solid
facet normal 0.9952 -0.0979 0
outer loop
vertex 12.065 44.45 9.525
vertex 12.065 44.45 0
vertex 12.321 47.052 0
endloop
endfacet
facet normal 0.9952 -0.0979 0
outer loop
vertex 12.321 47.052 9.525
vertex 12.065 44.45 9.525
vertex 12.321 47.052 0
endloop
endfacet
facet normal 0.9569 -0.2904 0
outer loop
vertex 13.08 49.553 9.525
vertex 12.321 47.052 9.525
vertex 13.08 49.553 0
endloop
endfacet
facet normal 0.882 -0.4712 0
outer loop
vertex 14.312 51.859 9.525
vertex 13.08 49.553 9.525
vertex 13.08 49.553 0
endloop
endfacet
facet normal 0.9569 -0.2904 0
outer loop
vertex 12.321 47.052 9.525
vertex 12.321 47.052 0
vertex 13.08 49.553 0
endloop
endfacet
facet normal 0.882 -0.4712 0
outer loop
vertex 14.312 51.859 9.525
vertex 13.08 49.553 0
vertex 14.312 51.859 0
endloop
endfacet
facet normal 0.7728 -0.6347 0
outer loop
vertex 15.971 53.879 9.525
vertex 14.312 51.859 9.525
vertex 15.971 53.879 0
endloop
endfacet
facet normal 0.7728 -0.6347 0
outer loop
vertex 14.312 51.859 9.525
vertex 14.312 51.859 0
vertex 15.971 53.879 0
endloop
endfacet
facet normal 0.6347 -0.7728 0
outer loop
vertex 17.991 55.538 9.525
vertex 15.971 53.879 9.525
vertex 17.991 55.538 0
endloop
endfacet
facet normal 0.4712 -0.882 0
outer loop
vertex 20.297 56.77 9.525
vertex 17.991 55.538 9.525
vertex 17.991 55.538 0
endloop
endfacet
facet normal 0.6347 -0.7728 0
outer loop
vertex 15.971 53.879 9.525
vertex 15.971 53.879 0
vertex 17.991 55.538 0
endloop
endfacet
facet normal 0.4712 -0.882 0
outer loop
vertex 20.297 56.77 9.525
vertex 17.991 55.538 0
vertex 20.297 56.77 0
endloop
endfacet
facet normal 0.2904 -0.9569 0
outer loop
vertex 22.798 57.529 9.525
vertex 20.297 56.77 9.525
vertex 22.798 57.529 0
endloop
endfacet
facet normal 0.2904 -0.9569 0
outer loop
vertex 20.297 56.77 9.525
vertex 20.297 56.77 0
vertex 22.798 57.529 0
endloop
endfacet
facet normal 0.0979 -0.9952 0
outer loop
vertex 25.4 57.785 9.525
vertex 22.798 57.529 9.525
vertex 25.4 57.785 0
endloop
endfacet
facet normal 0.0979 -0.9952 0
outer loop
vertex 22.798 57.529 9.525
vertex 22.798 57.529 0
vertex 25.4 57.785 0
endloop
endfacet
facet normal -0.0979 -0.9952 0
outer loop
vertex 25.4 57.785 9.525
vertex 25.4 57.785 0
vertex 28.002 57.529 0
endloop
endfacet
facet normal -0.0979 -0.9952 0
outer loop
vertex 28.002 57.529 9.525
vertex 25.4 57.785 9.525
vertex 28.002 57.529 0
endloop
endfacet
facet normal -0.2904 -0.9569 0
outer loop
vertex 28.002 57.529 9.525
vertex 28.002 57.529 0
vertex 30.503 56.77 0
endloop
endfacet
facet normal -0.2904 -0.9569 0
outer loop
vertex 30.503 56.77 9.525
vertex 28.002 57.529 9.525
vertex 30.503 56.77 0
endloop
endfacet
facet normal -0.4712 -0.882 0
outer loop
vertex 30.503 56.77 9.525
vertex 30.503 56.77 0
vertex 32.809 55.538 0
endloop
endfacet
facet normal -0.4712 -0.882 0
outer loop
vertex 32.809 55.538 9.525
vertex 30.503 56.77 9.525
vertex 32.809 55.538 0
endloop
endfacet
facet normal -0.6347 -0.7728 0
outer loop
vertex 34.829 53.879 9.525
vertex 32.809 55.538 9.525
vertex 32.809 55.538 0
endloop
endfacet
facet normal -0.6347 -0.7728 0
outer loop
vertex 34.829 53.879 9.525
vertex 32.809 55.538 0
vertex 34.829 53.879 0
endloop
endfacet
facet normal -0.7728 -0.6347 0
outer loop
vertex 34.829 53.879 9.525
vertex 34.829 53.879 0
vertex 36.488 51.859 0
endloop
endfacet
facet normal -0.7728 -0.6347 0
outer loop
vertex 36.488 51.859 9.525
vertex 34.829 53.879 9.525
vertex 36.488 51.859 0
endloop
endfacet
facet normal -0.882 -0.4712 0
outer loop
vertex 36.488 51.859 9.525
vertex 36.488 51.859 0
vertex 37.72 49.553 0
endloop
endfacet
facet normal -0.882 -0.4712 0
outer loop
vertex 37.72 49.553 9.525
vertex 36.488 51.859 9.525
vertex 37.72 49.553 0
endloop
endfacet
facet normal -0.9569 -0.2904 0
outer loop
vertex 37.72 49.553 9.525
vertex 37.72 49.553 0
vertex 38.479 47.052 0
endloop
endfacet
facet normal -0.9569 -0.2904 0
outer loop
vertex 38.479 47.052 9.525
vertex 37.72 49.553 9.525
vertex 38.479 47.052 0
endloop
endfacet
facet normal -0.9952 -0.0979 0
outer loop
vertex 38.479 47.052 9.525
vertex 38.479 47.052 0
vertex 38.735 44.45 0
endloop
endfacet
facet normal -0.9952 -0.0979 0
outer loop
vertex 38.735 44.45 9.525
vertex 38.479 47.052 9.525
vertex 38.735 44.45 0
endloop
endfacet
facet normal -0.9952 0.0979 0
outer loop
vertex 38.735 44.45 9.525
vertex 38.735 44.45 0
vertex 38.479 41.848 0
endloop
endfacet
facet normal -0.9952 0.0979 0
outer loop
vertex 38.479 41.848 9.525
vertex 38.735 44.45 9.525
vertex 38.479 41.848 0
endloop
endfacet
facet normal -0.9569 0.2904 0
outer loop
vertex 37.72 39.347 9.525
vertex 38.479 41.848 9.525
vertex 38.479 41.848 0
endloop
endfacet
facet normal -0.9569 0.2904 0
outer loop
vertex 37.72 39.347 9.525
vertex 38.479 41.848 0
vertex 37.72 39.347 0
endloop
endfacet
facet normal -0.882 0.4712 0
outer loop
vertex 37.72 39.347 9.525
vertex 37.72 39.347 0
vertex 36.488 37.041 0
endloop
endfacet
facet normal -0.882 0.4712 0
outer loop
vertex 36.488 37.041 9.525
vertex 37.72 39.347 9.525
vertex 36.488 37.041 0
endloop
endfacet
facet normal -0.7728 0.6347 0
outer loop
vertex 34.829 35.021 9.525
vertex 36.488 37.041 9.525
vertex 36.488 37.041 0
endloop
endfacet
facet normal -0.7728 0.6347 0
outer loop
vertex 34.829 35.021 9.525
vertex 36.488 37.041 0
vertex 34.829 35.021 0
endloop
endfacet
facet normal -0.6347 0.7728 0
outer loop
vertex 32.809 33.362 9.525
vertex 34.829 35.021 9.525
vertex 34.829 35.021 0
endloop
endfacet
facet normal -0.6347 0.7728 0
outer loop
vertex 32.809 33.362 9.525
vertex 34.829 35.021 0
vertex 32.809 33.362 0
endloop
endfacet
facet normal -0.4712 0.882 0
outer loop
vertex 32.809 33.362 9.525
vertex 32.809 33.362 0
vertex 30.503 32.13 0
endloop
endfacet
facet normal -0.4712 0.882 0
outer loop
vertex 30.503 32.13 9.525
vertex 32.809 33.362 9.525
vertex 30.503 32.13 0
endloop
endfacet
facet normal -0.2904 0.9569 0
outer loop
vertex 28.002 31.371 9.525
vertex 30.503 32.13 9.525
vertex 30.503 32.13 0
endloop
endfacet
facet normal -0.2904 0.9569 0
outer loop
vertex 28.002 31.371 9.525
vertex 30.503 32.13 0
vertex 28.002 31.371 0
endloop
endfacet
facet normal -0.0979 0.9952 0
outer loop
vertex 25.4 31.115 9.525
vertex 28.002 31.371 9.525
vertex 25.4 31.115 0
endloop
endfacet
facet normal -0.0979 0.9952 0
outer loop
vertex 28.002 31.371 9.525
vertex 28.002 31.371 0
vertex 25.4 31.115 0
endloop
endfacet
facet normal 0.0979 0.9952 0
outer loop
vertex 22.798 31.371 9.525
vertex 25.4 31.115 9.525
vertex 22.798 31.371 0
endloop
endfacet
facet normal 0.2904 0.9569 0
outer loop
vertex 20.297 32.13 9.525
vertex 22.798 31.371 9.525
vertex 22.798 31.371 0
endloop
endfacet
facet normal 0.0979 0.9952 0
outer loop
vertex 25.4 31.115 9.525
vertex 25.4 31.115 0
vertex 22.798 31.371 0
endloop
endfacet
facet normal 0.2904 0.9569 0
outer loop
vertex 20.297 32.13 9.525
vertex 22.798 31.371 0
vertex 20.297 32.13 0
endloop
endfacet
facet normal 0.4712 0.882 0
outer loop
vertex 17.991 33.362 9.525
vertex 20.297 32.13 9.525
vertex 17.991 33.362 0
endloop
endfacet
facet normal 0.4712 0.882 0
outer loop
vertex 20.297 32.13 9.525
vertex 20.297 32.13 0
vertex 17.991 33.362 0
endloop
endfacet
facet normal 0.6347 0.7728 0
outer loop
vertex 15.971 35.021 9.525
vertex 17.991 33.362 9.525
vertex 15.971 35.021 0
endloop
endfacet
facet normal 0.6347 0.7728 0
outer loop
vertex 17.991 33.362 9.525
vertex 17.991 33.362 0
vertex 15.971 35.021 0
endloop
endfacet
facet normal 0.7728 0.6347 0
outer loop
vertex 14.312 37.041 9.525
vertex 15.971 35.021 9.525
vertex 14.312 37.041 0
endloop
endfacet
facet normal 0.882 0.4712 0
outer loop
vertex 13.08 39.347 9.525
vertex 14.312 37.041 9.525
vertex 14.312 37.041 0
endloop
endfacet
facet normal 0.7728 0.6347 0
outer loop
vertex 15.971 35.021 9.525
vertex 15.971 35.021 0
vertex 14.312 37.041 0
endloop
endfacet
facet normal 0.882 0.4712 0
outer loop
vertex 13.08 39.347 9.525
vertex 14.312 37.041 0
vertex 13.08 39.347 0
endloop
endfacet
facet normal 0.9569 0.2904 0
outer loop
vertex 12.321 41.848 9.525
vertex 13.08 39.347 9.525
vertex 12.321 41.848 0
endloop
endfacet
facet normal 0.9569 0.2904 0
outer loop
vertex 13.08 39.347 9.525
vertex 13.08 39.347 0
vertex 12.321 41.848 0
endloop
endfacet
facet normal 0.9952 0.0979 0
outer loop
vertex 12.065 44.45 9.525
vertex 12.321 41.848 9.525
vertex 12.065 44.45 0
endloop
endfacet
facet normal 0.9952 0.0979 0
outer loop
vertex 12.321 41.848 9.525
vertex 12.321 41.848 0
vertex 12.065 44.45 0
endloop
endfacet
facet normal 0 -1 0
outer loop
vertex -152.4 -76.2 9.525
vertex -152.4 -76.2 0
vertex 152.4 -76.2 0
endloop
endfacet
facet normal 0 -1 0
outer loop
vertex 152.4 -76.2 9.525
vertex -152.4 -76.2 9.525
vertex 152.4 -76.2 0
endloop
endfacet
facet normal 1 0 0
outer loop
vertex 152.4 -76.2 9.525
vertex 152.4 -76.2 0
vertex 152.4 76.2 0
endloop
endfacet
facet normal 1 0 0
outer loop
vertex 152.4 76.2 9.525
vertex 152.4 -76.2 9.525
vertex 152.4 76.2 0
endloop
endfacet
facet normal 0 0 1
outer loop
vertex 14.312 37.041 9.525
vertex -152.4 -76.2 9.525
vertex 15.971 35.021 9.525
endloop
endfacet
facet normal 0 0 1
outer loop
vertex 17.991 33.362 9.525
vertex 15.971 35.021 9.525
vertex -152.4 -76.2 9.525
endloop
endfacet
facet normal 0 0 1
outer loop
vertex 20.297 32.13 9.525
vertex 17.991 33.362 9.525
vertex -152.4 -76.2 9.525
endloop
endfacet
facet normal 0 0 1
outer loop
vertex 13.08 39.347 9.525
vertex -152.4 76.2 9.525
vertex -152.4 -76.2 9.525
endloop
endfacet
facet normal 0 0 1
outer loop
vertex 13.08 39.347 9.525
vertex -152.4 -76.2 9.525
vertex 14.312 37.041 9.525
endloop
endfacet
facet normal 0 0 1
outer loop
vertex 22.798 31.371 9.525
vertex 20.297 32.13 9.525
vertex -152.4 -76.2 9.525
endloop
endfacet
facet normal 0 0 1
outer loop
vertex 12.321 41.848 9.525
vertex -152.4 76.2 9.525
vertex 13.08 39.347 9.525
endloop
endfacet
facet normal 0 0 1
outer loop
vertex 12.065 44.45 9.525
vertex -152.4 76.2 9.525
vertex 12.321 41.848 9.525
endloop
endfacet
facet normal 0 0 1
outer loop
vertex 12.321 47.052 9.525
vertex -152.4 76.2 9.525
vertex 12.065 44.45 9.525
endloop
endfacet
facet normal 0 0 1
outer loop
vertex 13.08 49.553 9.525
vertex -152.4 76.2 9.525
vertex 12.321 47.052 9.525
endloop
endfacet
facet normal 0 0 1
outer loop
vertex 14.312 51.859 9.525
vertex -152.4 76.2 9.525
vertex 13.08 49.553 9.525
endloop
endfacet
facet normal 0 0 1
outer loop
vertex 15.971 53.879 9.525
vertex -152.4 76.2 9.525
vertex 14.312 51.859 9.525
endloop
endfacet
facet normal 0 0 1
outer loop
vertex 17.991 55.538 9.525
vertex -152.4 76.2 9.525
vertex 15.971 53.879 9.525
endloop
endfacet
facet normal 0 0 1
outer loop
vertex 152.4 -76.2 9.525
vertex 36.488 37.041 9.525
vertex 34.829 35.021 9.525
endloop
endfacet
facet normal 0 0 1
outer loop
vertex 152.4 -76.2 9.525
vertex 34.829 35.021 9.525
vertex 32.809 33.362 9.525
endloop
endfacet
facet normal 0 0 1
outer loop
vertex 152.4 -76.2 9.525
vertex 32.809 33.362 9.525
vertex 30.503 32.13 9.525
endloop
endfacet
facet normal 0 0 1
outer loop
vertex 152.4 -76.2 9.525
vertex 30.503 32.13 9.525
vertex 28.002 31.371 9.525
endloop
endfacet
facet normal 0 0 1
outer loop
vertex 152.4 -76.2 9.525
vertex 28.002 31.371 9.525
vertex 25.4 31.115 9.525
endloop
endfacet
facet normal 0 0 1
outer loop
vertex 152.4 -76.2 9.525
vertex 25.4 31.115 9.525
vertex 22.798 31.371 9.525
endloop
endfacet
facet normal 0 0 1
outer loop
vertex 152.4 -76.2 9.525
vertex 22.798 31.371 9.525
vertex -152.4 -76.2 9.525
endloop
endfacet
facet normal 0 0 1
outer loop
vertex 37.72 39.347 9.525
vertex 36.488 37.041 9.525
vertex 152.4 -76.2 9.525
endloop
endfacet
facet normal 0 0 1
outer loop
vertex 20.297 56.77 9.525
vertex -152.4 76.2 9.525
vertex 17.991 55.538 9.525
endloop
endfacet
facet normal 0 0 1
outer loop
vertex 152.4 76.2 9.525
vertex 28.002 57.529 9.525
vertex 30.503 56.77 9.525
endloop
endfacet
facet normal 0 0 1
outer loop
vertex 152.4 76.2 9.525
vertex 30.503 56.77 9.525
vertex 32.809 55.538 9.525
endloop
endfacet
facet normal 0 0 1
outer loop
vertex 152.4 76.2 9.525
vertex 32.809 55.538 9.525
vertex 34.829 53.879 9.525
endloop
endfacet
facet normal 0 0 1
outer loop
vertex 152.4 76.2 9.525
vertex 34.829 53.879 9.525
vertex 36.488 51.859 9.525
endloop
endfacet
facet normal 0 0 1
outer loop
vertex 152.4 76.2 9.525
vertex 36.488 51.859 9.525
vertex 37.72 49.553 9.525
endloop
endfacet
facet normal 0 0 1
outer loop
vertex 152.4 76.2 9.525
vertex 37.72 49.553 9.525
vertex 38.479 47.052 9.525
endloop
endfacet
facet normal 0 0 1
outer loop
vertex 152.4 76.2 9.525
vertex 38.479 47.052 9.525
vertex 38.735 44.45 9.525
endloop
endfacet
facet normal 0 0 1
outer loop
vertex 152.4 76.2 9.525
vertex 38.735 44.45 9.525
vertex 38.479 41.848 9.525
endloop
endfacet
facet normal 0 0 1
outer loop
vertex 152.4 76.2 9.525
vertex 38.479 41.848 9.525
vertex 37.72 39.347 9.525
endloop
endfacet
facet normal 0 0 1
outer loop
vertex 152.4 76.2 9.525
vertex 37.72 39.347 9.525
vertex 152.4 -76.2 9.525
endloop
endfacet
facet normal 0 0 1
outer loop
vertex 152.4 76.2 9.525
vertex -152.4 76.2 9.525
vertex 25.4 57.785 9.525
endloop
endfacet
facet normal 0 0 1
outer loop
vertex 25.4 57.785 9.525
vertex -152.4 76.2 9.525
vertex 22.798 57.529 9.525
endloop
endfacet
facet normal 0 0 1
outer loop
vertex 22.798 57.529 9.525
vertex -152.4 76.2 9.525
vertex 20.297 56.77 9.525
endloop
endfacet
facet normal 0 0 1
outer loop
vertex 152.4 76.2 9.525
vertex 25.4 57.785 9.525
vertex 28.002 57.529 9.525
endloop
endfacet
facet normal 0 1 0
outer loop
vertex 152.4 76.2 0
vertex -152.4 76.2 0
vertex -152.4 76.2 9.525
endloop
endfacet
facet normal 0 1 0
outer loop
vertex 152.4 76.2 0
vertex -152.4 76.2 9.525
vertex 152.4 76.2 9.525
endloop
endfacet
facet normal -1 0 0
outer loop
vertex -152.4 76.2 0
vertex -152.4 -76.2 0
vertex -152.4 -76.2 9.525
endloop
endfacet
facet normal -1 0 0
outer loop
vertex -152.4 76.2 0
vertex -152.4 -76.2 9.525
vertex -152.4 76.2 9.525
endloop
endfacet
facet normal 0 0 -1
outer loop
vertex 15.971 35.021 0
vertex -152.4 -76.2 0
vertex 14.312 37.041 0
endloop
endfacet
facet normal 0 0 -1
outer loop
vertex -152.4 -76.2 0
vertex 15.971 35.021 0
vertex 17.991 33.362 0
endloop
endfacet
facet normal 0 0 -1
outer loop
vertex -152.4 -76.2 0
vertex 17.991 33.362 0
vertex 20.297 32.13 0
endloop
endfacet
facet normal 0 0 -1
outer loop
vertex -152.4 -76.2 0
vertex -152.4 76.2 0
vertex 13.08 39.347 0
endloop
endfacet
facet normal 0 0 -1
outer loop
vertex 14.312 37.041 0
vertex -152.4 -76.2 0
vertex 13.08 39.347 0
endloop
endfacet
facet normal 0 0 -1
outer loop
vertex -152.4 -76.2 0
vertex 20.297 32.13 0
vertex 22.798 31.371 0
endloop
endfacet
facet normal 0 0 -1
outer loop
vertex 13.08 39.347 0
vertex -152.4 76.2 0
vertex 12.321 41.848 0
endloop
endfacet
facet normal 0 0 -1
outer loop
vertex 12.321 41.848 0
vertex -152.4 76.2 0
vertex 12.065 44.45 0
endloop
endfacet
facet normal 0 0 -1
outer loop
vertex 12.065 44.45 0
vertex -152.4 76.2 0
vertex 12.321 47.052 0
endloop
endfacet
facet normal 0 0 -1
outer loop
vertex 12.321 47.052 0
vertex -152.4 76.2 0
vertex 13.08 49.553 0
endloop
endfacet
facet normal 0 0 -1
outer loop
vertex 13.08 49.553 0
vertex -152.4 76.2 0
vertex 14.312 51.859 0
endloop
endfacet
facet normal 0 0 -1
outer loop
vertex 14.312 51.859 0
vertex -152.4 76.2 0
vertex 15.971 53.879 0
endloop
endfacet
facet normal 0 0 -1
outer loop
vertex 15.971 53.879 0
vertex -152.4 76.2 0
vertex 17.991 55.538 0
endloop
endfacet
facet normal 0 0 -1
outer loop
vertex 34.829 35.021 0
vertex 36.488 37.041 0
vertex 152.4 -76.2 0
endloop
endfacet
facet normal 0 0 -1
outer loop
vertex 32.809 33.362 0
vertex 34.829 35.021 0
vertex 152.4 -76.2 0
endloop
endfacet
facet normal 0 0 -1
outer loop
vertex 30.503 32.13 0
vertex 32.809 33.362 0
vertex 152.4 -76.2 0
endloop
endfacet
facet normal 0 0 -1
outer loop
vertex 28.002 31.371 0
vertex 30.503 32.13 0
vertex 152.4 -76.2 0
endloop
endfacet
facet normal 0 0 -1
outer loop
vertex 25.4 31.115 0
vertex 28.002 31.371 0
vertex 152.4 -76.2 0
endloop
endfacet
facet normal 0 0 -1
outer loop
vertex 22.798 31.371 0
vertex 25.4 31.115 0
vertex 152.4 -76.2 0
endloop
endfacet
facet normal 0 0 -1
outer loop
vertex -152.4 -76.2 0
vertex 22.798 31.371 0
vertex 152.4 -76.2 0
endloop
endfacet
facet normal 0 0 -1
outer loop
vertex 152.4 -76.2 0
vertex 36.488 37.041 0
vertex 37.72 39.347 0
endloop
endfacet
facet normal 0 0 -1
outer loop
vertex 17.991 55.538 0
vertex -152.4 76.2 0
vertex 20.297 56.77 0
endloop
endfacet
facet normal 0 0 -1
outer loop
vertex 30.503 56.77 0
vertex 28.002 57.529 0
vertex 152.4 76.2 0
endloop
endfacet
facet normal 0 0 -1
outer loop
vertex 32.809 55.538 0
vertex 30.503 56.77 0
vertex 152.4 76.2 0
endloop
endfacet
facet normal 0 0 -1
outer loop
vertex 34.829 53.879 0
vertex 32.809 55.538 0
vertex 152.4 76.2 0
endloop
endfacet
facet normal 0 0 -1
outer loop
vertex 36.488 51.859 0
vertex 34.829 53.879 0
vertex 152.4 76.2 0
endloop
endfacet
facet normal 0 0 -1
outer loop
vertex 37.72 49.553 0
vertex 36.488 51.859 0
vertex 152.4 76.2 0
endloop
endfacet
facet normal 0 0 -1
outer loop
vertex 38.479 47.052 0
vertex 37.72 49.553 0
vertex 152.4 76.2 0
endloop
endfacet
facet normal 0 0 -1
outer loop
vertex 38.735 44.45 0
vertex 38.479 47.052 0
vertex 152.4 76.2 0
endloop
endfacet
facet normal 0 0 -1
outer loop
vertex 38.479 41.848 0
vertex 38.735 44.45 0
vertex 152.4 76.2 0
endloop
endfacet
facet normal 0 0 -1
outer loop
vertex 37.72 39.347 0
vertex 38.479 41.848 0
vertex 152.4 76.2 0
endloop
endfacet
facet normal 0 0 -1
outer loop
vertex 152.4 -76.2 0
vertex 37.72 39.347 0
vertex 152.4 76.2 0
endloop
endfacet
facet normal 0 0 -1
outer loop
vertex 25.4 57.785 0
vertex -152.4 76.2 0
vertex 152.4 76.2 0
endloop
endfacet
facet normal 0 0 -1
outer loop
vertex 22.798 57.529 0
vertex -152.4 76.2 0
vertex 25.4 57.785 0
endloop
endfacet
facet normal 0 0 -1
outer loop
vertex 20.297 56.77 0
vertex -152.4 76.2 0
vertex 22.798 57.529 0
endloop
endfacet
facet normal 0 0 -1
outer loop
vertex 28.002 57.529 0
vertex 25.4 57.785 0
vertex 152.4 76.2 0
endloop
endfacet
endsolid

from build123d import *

# Parameters (mm, degrees)
SKETCH1_W                     = 304.8
SKETCH1_H                     = 152.4
BOSS_EXTRUDE1_DEPTH           = 9.525
SKETCH5_R                     = 13.335
CUT_EXTRUDE3_DEPTH            = 171.65440406
F_1_1_05_DIAMETER_HOLE1_D     = 26.67
F_1_1_05_DIAMETER_HOLE1_DEPTH = 60.324
F_1_1_05_DIAMETER_HOLE1_TIP   = 8.012476355
F_1_1_05_DIAMETER_HOLE2_D     = 26.67
F_1_1_05_DIAMETER_HOLE2_DEPTH = 60.324
F_1_1_05_DIAMETER_HOLE2_TIP   = 8.012476355


with BuildPart() as part:
    # Sketch1 → Boss-Extrude1 (new body)
    with BuildSketch(Plane.XY):
        Rectangle(SKETCH1_W, SKETCH1_H)
    extrude(amount=BOSS_EXTRUDE1_DEPTH)

    # Sketch5 → Cut-Extrude3 (cut, through all)
    with BuildSketch(Plane(origin=(0, 0, 0), x_dir=(-1, 0, 0), z_dir=(0, 0, -1))):
        with Locations((-25.4, 44.45)):
            Circle(SKETCH5_R)
    extrude(amount=-CUT_EXTRUDE3_DEPTH, mode=Mode.SUBTRACT)

    # 1 (1.05) Diameter Hole1
    with Locations(Plane(origin=(1137.132872188, -76.2, 69.85), x_dir=(1, 0, 0), z_dir=(0, 0, 1))):
        with Locations((-1111.732872188, 120.65)):
            Hole(F_1_1_05_DIAMETER_HOLE1_D / 2, depth=F_1_1_05_DIAMETER_HOLE1_DEPTH)
            with Locations((0, 0, -(F_1_1_05_DIAMETER_HOLE1_DEPTH + F_1_1_05_DIAMETER_HOLE1_TIP / 2))):  # 118° drill point
                Cone(0, F_1_1_05_DIAMETER_HOLE1_D / 2, F_1_1_05_DIAMETER_HOLE1_TIP, mode=Mode.SUBTRACT)

    # 1 (1.05) Diameter Hole2
    with Locations(Plane(origin=(1137.132872188, -76.2, 9.525), x_dir=(1, 0, 0), z_dir=(0, 0, 1))):
        with Locations((-1111.732872188, 120.65)):
            Hole(F_1_1_05_DIAMETER_HOLE2_D / 2, depth=F_1_1_05_DIAMETER_HOLE2_DEPTH)
            with Locations((0, 0, -(F_1_1_05_DIAMETER_HOLE2_DEPTH + F_1_1_05_DIAMETER_HOLE2_TIP / 2))):  # 118° drill point
                Cone(0, F_1_1_05_DIAMETER_HOLE2_D / 2, F_1_1_05_DIAMETER_HOLE2_TIP, mode=Mode.SUBTRACT)


solid = part.part
